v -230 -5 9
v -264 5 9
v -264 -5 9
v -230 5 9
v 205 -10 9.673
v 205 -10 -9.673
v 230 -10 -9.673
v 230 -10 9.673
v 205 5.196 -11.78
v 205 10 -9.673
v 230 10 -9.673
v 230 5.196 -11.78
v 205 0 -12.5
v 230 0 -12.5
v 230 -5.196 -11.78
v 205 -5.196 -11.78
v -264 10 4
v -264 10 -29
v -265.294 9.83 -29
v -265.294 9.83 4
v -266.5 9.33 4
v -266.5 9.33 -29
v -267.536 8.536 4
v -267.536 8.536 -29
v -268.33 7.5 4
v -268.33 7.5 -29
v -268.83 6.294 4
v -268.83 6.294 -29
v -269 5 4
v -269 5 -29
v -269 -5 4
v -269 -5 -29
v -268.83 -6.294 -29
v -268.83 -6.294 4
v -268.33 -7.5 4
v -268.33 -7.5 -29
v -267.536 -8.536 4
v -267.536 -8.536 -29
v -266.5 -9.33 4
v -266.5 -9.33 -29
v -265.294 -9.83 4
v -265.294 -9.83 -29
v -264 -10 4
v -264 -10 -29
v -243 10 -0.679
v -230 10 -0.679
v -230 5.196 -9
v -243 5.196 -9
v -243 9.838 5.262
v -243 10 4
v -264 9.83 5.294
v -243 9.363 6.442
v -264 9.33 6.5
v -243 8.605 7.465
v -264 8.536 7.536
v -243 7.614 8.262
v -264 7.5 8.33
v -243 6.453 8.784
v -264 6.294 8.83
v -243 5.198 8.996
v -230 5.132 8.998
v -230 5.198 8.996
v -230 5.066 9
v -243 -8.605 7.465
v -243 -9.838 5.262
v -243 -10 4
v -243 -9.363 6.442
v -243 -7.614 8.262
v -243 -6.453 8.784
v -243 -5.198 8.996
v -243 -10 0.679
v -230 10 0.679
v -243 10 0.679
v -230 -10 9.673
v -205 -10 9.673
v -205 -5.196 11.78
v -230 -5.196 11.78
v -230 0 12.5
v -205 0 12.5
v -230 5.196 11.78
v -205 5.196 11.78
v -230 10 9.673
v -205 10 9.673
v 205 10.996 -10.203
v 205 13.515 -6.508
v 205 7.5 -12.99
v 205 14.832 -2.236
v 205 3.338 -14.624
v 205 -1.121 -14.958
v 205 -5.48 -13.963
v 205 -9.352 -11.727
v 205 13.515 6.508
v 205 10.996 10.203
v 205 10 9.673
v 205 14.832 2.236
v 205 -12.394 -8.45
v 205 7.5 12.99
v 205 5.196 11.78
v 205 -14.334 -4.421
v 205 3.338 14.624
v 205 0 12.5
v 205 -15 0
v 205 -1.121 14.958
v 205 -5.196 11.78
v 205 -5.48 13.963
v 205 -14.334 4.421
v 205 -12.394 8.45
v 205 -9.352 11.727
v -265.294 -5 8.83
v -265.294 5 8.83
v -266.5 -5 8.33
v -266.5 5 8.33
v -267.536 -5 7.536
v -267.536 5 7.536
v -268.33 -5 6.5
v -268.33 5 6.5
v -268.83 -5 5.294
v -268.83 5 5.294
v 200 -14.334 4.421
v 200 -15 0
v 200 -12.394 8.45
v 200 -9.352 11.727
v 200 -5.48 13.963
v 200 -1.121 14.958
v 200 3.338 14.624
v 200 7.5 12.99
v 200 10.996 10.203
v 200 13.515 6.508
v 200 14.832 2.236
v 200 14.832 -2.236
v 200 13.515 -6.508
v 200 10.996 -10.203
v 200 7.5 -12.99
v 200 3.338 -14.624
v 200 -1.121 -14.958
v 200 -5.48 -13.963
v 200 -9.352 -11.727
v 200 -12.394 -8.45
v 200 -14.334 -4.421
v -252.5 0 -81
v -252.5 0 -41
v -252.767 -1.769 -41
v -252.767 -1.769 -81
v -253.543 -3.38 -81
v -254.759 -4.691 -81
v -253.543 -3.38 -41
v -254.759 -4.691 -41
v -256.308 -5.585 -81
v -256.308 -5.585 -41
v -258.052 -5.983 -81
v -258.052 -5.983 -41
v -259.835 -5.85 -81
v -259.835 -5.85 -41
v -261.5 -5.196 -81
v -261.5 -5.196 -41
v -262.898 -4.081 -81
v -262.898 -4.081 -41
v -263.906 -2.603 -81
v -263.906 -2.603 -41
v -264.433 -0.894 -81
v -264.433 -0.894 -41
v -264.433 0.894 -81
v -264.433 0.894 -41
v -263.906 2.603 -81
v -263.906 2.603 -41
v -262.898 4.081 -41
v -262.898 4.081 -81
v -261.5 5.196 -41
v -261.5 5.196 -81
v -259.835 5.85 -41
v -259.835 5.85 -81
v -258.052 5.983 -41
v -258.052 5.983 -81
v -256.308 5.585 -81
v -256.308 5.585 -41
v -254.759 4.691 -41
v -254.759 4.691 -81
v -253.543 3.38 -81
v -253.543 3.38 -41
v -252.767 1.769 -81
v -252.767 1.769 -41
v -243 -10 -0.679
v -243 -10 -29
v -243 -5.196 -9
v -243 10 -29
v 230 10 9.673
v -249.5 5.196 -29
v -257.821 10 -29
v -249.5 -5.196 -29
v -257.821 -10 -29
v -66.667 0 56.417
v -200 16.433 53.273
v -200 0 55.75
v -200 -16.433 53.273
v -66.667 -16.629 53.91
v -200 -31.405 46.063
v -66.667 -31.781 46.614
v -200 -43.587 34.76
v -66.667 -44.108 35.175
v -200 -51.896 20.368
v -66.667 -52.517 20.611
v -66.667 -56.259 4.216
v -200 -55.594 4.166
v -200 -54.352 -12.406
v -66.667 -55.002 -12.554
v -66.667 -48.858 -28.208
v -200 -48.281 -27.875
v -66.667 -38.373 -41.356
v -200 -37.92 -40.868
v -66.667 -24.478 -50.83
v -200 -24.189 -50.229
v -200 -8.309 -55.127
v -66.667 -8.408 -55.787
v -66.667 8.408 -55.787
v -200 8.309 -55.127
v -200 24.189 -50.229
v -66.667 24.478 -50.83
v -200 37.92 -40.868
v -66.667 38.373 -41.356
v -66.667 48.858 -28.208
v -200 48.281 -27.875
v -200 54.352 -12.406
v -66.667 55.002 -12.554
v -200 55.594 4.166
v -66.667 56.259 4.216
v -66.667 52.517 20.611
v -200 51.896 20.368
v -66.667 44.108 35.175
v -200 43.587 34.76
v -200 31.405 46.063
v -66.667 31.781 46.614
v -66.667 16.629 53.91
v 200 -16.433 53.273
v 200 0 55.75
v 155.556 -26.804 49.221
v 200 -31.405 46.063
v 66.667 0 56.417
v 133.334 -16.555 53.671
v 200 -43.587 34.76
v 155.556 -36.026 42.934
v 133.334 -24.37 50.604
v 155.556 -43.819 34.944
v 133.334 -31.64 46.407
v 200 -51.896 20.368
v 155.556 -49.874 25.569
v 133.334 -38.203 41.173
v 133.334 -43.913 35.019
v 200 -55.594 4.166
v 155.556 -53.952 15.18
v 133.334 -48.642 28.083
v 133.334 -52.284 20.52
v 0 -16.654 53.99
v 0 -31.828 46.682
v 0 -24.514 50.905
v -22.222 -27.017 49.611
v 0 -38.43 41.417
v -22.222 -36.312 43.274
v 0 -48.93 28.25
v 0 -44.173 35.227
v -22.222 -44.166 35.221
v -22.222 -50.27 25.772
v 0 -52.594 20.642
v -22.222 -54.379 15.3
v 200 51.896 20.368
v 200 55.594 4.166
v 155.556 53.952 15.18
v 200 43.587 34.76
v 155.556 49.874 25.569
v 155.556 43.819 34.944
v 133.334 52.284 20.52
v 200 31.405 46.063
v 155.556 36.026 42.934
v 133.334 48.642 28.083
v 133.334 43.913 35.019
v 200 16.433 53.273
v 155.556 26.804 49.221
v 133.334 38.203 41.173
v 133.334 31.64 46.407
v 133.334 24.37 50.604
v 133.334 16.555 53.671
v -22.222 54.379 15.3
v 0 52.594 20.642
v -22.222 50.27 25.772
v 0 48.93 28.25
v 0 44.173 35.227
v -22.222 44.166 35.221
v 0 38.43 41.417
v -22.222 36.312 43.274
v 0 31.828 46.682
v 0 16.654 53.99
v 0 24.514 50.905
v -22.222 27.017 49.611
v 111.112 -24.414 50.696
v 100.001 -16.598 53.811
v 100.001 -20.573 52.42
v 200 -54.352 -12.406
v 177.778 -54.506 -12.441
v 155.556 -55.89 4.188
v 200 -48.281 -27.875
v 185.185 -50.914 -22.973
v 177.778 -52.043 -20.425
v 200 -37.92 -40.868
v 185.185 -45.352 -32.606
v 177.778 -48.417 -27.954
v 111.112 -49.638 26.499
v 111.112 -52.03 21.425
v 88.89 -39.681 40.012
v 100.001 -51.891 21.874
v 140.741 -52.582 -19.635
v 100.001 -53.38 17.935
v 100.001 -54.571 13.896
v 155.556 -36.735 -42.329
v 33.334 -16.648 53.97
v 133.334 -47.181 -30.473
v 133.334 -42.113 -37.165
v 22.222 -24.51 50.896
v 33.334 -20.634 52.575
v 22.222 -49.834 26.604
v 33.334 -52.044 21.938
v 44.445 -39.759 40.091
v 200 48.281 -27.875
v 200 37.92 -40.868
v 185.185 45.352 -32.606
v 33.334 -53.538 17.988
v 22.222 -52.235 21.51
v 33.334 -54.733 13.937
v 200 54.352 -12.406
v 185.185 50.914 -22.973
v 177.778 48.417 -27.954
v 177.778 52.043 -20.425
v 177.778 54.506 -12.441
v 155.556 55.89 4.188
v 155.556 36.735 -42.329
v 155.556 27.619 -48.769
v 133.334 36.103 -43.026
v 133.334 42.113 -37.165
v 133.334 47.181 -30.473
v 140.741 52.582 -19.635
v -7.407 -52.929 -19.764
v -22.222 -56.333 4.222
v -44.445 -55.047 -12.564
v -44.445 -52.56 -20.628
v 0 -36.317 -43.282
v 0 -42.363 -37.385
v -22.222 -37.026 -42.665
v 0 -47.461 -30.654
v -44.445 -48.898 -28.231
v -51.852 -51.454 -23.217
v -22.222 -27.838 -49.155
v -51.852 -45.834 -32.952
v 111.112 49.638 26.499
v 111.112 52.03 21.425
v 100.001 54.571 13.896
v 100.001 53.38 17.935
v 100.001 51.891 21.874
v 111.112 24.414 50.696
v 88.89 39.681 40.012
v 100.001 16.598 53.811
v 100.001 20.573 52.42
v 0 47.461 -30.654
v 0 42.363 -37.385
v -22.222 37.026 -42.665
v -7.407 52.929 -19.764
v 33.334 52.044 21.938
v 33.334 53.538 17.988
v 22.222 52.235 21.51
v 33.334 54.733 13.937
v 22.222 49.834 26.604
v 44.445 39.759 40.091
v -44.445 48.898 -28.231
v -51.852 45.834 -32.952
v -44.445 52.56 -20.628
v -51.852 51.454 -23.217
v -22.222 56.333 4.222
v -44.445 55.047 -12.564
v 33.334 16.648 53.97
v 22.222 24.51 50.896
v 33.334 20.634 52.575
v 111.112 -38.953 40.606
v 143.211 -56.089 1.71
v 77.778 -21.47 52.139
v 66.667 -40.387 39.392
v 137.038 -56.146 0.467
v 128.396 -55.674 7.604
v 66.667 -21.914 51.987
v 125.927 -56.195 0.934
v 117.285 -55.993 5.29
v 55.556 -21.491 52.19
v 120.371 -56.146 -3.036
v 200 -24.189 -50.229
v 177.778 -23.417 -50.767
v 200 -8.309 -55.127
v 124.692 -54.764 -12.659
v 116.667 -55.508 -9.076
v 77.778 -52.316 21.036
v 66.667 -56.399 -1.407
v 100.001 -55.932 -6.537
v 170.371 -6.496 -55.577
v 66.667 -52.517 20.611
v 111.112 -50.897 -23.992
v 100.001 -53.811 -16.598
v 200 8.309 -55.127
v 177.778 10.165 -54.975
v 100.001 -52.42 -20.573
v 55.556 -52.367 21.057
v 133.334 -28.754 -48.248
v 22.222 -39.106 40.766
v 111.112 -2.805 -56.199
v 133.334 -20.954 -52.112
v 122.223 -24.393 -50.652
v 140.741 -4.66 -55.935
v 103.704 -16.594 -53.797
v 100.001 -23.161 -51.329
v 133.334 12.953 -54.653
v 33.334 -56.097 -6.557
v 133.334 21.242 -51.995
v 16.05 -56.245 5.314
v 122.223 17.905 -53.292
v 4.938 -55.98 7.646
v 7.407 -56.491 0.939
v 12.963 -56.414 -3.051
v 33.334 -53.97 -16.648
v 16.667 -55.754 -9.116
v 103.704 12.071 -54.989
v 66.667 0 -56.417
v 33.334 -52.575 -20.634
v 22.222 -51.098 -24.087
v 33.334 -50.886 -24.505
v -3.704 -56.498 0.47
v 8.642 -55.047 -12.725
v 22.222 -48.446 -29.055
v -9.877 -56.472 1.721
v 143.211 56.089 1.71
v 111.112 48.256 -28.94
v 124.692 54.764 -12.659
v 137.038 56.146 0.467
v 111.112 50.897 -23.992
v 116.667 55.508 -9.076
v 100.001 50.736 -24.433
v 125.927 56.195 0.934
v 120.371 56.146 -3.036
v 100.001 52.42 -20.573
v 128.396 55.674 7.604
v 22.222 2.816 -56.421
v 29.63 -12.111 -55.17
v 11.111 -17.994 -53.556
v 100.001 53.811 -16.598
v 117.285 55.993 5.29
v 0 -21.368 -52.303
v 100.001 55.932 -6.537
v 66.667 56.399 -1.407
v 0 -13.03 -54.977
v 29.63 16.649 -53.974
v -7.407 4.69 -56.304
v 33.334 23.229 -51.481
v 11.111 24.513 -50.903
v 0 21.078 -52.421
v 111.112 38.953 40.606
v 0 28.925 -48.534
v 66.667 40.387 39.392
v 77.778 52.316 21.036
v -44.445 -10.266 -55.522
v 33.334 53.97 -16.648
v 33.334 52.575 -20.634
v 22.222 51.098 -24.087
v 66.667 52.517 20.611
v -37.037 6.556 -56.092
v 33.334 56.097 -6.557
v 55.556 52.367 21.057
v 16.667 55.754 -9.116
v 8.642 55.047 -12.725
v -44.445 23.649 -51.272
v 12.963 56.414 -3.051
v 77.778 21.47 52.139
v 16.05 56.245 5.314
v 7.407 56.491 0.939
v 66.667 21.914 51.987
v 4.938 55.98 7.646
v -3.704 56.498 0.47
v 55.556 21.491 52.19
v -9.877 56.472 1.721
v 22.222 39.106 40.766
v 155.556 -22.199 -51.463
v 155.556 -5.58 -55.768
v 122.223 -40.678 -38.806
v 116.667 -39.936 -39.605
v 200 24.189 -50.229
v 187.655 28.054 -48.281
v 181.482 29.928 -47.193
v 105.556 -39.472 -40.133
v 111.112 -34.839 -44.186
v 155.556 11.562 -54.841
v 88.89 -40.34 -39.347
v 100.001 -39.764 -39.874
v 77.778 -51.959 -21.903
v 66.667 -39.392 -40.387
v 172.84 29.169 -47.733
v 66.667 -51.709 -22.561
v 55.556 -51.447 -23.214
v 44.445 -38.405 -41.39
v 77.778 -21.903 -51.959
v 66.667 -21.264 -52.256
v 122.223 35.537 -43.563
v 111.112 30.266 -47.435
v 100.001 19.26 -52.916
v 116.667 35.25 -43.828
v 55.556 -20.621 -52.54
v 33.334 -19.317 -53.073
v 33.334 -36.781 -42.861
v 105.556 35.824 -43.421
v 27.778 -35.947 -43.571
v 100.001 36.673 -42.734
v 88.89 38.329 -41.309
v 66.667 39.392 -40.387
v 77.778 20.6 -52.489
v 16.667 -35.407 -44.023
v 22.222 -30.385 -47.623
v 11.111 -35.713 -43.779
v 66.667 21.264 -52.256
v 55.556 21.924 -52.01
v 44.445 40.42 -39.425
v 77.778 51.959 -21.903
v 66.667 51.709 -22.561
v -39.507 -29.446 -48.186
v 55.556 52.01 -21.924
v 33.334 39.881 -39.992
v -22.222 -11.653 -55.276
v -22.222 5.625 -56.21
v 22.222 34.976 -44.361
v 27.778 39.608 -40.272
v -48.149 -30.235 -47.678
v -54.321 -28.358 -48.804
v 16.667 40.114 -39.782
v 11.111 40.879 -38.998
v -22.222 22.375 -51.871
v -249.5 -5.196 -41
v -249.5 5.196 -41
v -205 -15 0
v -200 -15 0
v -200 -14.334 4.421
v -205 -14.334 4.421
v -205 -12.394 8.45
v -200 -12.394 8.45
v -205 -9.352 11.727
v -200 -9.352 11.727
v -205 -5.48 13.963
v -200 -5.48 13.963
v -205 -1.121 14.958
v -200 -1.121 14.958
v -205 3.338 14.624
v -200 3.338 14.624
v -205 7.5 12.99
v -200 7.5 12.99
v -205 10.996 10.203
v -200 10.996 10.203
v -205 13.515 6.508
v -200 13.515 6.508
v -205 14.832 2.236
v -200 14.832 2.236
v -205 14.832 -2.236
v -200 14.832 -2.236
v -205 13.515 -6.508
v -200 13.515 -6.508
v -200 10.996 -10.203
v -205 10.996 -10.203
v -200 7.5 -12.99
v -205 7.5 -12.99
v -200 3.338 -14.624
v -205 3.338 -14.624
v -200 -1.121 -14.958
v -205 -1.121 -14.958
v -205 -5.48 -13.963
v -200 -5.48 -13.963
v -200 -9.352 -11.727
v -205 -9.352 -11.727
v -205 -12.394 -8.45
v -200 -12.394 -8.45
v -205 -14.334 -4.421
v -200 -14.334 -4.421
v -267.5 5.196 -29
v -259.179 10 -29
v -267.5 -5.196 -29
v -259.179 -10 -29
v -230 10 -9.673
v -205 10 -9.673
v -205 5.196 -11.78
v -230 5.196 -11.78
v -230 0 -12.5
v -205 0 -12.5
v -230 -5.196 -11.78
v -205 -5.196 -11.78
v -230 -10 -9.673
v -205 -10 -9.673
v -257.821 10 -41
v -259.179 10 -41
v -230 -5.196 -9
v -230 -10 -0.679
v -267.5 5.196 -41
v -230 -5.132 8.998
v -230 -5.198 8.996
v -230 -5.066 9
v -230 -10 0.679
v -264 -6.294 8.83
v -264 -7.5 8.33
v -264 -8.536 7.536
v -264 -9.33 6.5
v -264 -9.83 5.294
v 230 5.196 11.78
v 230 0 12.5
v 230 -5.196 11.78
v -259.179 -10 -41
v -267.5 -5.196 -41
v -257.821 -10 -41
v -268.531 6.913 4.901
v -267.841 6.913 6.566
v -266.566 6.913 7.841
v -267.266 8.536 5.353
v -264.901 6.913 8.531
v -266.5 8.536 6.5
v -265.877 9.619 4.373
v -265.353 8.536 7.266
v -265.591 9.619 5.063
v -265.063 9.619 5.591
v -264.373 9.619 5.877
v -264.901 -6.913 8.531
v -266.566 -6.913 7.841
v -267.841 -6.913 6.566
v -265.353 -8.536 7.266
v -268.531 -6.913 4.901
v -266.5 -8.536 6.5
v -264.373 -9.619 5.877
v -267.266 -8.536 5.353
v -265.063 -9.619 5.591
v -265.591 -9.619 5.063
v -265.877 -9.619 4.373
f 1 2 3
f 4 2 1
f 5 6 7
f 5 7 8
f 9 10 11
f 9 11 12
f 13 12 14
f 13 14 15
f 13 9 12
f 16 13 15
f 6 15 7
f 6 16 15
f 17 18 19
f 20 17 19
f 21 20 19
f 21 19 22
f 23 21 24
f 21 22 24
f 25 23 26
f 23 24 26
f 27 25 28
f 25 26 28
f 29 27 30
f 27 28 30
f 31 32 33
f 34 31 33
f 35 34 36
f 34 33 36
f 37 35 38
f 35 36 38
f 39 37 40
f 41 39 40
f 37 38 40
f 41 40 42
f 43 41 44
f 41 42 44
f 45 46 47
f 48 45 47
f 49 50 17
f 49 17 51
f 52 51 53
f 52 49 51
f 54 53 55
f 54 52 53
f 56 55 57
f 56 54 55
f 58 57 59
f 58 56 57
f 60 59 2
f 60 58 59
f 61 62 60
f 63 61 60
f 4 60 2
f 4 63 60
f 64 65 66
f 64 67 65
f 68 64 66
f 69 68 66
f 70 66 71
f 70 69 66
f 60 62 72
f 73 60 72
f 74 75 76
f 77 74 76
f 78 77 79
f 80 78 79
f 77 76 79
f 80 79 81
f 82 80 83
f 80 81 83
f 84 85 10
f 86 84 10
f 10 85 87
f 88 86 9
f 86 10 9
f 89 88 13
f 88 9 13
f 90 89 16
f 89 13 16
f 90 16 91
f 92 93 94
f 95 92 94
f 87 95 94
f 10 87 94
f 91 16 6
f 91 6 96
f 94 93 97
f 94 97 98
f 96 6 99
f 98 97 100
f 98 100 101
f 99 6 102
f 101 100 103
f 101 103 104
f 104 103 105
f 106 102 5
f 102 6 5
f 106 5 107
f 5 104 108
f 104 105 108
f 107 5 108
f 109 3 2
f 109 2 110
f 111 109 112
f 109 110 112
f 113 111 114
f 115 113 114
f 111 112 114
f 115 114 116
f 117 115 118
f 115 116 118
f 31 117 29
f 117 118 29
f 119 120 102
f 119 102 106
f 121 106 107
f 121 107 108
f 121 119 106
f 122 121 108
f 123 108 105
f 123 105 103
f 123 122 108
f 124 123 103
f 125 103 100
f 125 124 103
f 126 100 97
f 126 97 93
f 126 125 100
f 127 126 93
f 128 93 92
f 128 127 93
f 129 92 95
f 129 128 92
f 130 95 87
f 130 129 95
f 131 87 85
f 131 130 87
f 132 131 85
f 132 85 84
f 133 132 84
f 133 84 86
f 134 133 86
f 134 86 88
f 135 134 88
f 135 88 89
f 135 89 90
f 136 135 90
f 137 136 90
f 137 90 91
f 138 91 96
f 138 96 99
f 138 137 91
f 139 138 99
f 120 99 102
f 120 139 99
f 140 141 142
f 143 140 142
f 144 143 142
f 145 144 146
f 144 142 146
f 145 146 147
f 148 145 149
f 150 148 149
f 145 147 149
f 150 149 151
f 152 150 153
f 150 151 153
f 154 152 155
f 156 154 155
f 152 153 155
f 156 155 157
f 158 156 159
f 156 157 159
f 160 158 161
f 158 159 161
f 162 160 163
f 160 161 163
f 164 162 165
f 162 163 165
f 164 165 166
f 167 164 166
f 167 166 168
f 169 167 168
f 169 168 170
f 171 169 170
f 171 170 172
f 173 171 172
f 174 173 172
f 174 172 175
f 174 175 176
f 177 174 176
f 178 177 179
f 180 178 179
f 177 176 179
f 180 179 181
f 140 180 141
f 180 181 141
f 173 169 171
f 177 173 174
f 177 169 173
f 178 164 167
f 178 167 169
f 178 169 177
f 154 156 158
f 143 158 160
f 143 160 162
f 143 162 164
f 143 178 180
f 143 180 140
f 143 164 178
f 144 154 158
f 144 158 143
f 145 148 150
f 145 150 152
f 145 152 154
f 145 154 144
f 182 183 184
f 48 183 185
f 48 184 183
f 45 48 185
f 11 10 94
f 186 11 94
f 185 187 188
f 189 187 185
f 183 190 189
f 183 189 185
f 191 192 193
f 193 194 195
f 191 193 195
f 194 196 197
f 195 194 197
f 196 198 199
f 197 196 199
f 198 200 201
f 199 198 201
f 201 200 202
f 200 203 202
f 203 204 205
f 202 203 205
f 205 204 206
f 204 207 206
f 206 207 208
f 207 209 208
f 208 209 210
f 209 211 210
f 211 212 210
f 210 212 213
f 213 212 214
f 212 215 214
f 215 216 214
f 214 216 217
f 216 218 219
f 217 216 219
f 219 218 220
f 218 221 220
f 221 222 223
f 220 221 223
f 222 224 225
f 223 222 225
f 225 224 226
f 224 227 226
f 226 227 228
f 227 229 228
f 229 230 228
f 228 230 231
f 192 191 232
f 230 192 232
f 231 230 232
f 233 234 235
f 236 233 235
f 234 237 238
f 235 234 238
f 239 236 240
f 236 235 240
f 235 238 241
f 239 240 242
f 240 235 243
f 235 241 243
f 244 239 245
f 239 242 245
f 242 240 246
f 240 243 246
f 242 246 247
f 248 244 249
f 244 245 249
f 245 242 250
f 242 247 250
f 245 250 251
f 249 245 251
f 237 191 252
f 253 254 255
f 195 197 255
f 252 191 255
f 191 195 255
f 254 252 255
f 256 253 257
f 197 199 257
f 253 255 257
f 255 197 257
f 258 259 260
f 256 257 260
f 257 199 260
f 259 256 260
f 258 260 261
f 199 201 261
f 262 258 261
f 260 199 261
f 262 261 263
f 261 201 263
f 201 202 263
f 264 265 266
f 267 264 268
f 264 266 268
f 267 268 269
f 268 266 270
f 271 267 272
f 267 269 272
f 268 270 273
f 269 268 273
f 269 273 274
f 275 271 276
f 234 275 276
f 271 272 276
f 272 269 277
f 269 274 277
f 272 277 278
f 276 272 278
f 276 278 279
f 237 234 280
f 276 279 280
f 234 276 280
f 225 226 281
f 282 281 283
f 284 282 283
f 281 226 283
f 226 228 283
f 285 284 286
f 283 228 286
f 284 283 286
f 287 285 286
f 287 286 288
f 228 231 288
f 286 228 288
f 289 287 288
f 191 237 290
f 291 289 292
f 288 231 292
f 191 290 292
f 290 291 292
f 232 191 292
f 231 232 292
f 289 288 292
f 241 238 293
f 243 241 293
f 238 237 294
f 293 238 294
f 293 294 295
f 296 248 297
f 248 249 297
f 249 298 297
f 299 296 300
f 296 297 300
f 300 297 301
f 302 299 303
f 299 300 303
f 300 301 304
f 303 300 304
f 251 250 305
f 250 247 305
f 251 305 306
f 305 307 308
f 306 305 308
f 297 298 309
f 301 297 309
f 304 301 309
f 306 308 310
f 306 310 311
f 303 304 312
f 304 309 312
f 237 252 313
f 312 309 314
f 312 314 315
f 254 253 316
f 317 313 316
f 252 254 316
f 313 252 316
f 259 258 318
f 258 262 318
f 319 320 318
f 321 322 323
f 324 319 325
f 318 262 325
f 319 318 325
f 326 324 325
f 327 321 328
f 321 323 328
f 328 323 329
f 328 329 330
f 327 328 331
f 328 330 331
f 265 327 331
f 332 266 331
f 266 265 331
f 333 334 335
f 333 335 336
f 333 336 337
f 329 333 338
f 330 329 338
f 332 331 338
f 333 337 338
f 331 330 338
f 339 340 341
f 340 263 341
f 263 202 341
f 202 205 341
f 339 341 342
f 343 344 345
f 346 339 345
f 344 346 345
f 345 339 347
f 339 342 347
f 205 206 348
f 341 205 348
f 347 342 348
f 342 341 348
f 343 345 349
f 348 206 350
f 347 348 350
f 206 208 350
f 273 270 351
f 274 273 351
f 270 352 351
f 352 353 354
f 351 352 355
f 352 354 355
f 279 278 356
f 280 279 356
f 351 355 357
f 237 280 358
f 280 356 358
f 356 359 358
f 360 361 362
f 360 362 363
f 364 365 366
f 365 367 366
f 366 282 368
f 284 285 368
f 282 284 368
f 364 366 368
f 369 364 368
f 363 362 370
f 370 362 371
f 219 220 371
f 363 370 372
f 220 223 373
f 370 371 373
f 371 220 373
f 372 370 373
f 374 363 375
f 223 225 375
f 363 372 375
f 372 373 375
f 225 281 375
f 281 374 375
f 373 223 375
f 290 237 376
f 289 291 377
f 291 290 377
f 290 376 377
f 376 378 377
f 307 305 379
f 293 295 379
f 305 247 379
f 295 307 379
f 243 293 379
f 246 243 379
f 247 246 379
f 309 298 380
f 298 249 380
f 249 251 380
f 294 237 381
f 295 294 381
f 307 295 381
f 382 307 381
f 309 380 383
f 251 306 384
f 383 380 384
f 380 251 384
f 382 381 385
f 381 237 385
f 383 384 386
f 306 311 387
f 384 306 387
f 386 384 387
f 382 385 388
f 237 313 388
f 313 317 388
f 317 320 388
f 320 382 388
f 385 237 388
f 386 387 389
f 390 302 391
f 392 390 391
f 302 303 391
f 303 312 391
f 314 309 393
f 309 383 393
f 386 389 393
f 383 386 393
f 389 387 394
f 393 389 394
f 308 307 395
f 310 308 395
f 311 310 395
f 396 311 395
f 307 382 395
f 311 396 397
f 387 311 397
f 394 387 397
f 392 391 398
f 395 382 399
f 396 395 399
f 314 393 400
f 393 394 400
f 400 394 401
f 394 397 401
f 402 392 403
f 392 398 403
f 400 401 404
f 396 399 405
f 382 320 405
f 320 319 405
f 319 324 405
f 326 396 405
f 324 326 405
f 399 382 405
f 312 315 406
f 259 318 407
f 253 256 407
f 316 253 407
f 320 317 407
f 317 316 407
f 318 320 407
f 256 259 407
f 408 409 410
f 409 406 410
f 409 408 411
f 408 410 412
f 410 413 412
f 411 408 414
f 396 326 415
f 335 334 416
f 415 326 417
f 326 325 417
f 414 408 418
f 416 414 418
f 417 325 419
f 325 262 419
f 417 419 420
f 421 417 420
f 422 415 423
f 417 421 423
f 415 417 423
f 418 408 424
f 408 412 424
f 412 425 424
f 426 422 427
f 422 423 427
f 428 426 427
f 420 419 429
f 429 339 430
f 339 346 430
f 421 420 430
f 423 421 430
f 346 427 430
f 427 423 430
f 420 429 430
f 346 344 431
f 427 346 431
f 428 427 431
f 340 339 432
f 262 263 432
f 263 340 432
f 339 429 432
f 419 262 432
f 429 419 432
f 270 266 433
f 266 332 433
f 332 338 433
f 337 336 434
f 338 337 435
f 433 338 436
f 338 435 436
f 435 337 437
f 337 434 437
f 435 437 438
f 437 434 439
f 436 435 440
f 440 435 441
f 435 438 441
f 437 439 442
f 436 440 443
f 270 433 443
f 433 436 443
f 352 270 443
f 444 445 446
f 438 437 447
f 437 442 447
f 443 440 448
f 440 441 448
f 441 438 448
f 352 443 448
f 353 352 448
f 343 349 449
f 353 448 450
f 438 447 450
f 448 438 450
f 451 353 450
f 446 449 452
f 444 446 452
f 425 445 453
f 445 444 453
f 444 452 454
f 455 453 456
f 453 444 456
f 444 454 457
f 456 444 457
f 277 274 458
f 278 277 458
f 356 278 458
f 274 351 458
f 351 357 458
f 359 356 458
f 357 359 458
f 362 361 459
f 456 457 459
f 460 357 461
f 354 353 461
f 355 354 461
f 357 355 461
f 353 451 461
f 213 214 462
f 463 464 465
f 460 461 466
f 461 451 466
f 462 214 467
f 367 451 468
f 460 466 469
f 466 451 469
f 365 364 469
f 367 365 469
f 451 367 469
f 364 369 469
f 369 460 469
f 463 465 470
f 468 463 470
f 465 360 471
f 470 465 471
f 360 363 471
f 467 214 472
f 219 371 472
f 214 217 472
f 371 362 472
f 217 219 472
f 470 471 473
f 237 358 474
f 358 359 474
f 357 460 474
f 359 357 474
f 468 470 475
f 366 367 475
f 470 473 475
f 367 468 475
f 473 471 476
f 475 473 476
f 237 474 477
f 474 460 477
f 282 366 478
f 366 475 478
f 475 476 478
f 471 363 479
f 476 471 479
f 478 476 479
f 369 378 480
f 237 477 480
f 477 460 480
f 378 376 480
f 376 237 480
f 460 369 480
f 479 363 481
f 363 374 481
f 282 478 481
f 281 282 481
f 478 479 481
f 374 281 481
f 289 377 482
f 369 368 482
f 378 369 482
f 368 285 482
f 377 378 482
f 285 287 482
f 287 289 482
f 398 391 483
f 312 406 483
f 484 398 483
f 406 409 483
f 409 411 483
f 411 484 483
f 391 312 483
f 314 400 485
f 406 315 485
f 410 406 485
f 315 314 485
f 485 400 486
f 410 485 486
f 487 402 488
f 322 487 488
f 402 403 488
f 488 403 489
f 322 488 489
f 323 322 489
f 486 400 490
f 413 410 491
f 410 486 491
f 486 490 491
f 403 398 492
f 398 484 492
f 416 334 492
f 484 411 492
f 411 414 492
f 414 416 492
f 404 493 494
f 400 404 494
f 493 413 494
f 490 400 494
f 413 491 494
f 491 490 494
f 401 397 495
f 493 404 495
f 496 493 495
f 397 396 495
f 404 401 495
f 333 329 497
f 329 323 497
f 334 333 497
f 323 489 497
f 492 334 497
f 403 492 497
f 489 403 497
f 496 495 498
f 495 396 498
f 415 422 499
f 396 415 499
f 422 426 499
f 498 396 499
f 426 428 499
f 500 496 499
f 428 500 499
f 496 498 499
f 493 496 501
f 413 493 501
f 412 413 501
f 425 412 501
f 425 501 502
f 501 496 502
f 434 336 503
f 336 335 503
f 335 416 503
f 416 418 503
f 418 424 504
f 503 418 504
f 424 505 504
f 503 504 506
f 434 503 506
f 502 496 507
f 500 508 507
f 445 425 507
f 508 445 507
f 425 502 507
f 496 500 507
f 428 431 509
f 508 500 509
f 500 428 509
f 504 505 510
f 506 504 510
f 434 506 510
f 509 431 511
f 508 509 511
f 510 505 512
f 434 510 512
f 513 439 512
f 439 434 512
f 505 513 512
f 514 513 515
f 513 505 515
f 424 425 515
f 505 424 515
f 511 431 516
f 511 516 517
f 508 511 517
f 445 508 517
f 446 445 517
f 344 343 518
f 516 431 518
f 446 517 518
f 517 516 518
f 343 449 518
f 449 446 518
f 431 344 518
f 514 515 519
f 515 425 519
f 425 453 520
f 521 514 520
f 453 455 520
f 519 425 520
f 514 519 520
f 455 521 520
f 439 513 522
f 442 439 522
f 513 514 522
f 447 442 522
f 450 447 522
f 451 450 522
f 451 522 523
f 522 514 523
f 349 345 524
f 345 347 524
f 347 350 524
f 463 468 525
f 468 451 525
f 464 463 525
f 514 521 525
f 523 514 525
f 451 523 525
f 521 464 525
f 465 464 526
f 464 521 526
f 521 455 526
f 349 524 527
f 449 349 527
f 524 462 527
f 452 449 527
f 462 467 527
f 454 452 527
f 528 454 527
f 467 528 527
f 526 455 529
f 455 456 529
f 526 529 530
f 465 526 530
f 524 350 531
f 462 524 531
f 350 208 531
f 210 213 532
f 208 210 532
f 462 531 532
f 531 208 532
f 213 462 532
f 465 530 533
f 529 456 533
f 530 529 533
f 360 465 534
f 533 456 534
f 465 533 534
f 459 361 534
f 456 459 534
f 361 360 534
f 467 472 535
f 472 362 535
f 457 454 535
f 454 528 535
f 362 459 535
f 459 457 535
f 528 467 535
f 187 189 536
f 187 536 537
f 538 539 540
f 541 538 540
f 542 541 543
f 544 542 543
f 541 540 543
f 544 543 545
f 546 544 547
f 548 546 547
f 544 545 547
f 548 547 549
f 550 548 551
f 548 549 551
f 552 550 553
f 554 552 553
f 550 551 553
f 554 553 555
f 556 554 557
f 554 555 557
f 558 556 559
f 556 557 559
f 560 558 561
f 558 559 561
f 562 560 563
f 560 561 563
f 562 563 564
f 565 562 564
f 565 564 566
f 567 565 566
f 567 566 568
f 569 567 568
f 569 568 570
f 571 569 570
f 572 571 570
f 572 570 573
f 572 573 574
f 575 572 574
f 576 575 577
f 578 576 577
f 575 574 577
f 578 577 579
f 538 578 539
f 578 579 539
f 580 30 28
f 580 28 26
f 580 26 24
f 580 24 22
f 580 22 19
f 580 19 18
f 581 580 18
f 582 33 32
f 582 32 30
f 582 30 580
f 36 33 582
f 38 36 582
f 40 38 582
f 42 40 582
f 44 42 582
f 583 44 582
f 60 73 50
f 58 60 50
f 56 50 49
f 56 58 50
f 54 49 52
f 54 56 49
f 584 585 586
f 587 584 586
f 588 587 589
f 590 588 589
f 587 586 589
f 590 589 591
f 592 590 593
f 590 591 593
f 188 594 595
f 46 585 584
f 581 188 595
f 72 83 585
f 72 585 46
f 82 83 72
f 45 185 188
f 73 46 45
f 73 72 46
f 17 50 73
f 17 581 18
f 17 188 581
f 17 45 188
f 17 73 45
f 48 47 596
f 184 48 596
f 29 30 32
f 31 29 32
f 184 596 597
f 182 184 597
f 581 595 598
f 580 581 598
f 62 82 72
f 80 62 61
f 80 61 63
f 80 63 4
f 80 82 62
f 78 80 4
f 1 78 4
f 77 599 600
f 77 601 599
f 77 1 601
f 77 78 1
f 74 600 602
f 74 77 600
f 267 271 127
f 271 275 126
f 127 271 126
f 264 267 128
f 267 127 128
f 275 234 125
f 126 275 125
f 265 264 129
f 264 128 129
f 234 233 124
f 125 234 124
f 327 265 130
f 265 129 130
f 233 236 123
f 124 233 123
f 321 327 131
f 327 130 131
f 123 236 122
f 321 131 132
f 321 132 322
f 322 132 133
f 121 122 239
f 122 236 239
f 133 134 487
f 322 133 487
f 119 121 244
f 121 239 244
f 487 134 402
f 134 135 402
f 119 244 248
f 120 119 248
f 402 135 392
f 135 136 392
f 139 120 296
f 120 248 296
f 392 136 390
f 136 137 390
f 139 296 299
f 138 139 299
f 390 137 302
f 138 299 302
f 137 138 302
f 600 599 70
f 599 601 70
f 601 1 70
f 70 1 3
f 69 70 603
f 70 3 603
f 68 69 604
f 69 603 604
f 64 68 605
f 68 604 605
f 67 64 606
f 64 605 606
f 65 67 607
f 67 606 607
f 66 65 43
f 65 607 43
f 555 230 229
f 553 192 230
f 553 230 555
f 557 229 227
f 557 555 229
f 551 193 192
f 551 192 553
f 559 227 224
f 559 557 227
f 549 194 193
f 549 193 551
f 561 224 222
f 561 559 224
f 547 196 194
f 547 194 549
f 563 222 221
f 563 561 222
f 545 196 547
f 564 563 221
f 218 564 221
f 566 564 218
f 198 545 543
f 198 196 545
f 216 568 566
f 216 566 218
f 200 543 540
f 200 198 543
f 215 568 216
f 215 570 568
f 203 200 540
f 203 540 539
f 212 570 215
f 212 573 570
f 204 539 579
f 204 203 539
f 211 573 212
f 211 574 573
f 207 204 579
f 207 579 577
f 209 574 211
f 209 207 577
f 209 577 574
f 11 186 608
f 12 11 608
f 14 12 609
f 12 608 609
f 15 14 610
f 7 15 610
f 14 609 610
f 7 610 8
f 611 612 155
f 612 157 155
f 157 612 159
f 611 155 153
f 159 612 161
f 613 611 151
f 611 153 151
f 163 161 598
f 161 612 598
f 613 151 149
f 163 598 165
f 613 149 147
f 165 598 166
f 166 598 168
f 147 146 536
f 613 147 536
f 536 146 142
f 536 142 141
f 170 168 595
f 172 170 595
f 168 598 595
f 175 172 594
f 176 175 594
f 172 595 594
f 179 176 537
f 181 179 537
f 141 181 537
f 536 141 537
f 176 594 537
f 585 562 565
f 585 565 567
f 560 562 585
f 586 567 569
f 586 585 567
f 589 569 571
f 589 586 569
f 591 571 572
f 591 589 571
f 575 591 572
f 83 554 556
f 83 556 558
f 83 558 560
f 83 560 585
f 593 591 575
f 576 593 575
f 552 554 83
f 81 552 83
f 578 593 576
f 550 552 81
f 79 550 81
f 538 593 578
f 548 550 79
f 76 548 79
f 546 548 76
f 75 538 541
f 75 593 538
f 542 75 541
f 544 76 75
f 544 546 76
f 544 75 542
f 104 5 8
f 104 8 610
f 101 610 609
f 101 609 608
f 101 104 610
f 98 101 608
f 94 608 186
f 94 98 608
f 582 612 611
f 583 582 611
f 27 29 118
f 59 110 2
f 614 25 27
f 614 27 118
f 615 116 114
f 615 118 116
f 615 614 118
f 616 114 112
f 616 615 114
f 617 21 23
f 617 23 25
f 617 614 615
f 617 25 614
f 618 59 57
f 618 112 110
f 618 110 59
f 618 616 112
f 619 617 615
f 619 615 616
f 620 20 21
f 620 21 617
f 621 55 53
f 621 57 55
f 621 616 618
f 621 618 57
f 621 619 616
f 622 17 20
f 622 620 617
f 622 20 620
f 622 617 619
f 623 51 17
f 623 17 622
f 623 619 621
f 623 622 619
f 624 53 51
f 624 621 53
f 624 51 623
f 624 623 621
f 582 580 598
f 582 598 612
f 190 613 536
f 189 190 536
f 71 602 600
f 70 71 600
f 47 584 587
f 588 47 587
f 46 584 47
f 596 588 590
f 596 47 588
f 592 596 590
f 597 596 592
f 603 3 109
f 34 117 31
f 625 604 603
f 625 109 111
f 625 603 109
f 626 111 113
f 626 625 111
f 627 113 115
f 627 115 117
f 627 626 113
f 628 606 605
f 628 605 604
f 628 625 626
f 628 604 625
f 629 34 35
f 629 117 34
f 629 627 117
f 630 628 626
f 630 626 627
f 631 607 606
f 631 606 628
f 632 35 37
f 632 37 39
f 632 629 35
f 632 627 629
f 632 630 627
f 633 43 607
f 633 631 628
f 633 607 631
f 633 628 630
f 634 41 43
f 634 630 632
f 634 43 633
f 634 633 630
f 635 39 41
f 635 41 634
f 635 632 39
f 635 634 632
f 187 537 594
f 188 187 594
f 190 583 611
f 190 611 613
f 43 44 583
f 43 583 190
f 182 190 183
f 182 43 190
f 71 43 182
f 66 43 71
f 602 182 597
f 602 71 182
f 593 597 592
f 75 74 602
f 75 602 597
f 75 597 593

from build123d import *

# Parameters (mm, degrees)
F0_W          = 400
F0_H          = 55.75
F2_W          = 20
F2_H          = 19.3462212823
F3_DEPTH      = 30
F4_R          = 15
F5_DEPTH      = 5
F7_DEPTH      = 13
F9_DEPTH      = 50
F11_DEPTH     = 12
F12_R         = 6
F13_DEPTH     = 40
F14_T1_DEPTH  = 63
F14_T3_DEPTH  = 10
F14_S7_W      = 5.1
F14_S7_H      = 5.1
F14_T8_DEPTH  = 5.1
F14_S13_W     = 5.1
F14_S13_H     = 5.1
F14_T14_DEPTH = 5.1
F14_T20_DEPTH = 51
F14_T25_DEPTH = 51


# Not quite as in the source:
# - a fillet or chamfer that OpenCascade refuses, or shapes differently, is made with other operations: its cross-section is extruded or revolved along the edge and cut away or added
# - a pattern or mirror of a feature is missing from the dataset's text; its kind, count and spacing are read off the source's solid


with BuildPart() as f1:
    # F0 (on Front) → F1 (revolve)
    with BuildSketch(Plane.XZ):
        with Locations((0, 27.875)):
            Rectangle(F0_W, F0_H)
        with BuildLine():
            ThreePointArc((200, 55.75), (0, 56.5), (-200, 55.75))
            Line((-200, 55.75), (200, 55.75))
        make_face()
    revolve(axis=Axis((0, 0, 0), (1, 0, 0)))

    # F2 (on face) → F3 (join)
    with BuildSketch(Plane(origin=(-200, 0, 0), x_dir=(0, -1, 0), z_dir=(-1, 0, 0))):
        Rectangle(F2_W, F2_H)
        with BuildLine():
            ThreePointArc((-10, -9.6731106412), (0, -12.5), (10, -9.6731106412))
            Line((10, -9.6731106412), (-10, -9.6731106412))
        make_face()
        with BuildLine():
            Line((-10, 9.6731106412), (10, 9.6731106412))
            ThreePointArc((10, 9.6731106412), (0, 12.5), (-10, 9.6731106412))
        make_face()
    f3 = extrude(amount=F3_DEPTH)

    # F3_copies: F3 across plane
    add(f3.mirror(Plane(origin=(0, 0, 0), x_dir=(0, 0, 1), z_dir=(1, 0, 0))))

    # F4 (on face) → F5 (join)
    with BuildSketch(Plane(origin=(-200, 0, 0), x_dir=(0, -1, 0), z_dir=(-1, 0, 0))):
        Circle(F4_R)
        with BuildLine():
            Line((10, 9.6731106412), (10, -9.6731106412))
            ThreePointArc((10, -9.6731106412), (0, -12.5), (-10, -9.6731106412))
            Line((-10, -9.6731106412), (-10, 9.6731106412))
            ThreePointArc((-10, 9.6731106412), (0, 12.5), (10, 9.6731106412))
        make_face(mode=Mode.SUBTRACT)
    f5 = extrude(amount=F5_DEPTH)

    # F5_copies: F5 across plane
    add(f5.mirror(Plane(origin=(0, 0, 0), x_dir=(0, 0, 1), z_dir=(1, 0, 0))))

    # F6 (on face) → F7 (join)
    with BuildSketch(Plane(origin=(-230, 0, 0), x_dir=(0, -1, 0), z_dir=(-1, 0, 0))):
        Polygon((10, 0.6794919243), (5.1961524227, 9), (-5.1961524227, 9), (-10, 0.6794919243), (-10, -0.6794919243), (-5.1961524227, -9), (5.1961524227, -9), (10, -0.6794919243), align=None)
    extrude(amount=F7_DEPTH)

    # F8 (on face) → F9 (join)
    with BuildSketch(Plane.XY.offset(9)):
        Polygon((-243, 10), (-269, 10), (-269, -10), (-243, -10), (-243, -5.1961524227), (-243, 5.1961524227), align=None)
    extrude(amount=-F9_DEPTH)

    # F10 (on face) → F11 (cut)
    with BuildSketch(Plane(origin=(0, 0, -41), x_dir=(1, 0, 0), z_dir=(0, 0, -1))):
        Polygon((-269, -10), (-259.1794919243, -10), (-267.5, -5.1961524227), (-267.5, 5.1961524227), (-259.1794919243, 10), (-269, 10), align=None)
        Polygon((-257.8205080757, -10), (-243, -10), (-243, 10), (-257.8205080757, 10), (-249.5, 5.1961524227), (-249.5, -5.1961524227), align=None)
    extrude(amount=-F11_DEPTH, mode=Mode.SUBTRACT)

    # F12 (on face) → F13 (join)
    with BuildSketch(Plane(origin=(0, 0, -41), x_dir=(1, 0, 0), z_dir=(0, 0, -1))):
        with Locations((-258.5, 0)):
            Circle(F12_R)
    extrude(amount=F13_DEPTH)

    # F14: fillet of radius 5 on 5 edges, made by hand

    # F14_s2 → F14_t1 (cut)
    with BuildSketch(Plane.XY.offset(-59)):
        with BuildLine():
            ThreePointArc((-269, -5), (-267.5355339059, -8.5355339059), (-264, -10))
            Line((-264, -10), (-264, -10.1))
            Line((-264, -10.1), (-269.1, -10.1))
            Line((-269.1, -10.1), (-269.1, -5))
            Line((-269.1, -5), (-269, -5))
        make_face()
        with BuildLine():
            ThreePointArc((-264, 10), (-267.5355339059, 8.5355339059), (-269, 5))
            Line((-269, 5), (-269.1, 5))
            Line((-269.1, 5), (-269.1, 10.1))
            Line((-269.1, 10.1), (-264, 10.1))
            Line((-264, 10.1), (-264, 10))
        make_face()
    extrude(amount=F14_T1_DEPTH, mode=Mode.SUBTRACT)

    # F14_s4 → F14_t3 (cut)
    with BuildSketch(Plane.XZ.offset(-5)):
        with BuildLine():
            ThreePointArc((-264, 9), (-267.5355339059, 7.5355339059), (-269, 4))
            Line((-269, 4), (-269.1, 4))
            Line((-269.1, 4), (-269.1, 9.1))
            Line((-269.1, 9.1), (-264, 9.1))
            Line((-264, 9.1), (-264, 9))
        make_face()
    extrude(amount=F14_T3_DEPTH, mode=Mode.SUBTRACT)


with BuildPart() as f14_tool6:
    # F14_s7 → F14_t8 (new body)
    with BuildSketch(Plane.XZ.offset(5)):
        with Locations((-266.55, 6.55)):
            Rectangle(F14_S7_W, F14_S7_H)
    extrude(amount=F14_T8_DEPTH)

    # F14_s9 → F14_t10 (revolve, cut)
    with BuildSketch(Plane(origin=(-264, -5, 4), x_dir=(0.7071067812, 0, -0.7071067812), z_dir=(-0.7071067812, 0, -0.7071067812))):
        with BuildLine():
            ThreePointArc((0, -5), (5, 0), (0, 5))
            Line((0, 5), (0, -5))
        make_face()
    revolve(axis=Axis((-264, -5, 4), (0, -1, 0)), mode=Mode.SUBTRACT)


with BuildPart() as f1_1:
    add(f1.part)

    # F14_t5: cut F14_tool6
    add(f14_tool6.part, mode=Mode.SUBTRACT)


with BuildPart() as f14_tool12:
    # F14_s13 → F14_t14 (new body)
    with BuildSketch(Plane.XZ.offset(-5)):
        with Locations((-266.55, 6.55)):
            Rectangle(F14_S13_W, F14_S13_H)
    extrude(amount=-F14_T14_DEPTH)

    # F14_s15 → F14_t16 (revolve, cut)
    with BuildSketch(Plane(origin=(-264, 5, 4), x_dir=(0.7071067812, 0, -0.7071067812), z_dir=(0.7071067812, 0, 0.7071067812))):
        with BuildLine():
            ThreePointArc((0, -5), (5, 0), (0, 5))
            Line((0, 5), (0, -5))
        make_face()
    revolve(axis=Axis((-264, 5, 4), (0, 1, 0)), mode=Mode.SUBTRACT)


with BuildPart() as f1_2:
    add(f1_1.part)

    # F14_t11: cut F14_tool12
    add(f14_tool12.part, mode=Mode.SUBTRACT)


with BuildPart() as f14_tool18:
    # F14_s19 → F14_t20 (new body)
    with BuildSketch(Plane.YZ.offset(-264)):
        with BuildLine():
            ThreePointArc((-5, 9), (-8.5355339059, 7.5355339059), (-10, 4))
            Line((-10, 4), (-10.1, 4))
            Line((-10.1, 4), (-10.1, 9.1))
            Line((-10.1, 9.1), (-5, 9.1))
            Line((-5, 9.1), (-5, 9))
        make_face()
    extrude(amount=F14_T20_DEPTH)

    split(bisect_by=Plane.YZ.offset(-230), keep=Keep.BOTTOM)


with BuildPart() as f1_3:
    add(f1_2.part)

    # F14_t17: cut F14_tool18
    add(f14_tool18.part, mode=Mode.SUBTRACT)


with BuildPart() as f14_tool23:
    # F14_s24 → F14_t25 (new body)
    with BuildSketch(Plane.YZ.offset(-213)):
        with BuildLine():
            ThreePointArc((10, 4), (8.5355339059, 7.5355339059), (5, 9))
            Line((5, 9), (5, 9.1))
            Line((5, 9.1), (10.1, 9.1))
            Line((10.1, 9.1), (10.1, 4))
            Line((10.1, 4), (10, 4))
        make_face()
    extrude(amount=-F14_T25_DEPTH)

    split(bisect_by=Plane.YZ.offset(-230), keep=Keep.BOTTOM)


with BuildPart() as f1_4:
    add(f1_3.part)

    # F14_t22: cut F14_tool23
    add(f14_tool23.part, mode=Mode.SUBTRACT)


solid = f1_4.part
